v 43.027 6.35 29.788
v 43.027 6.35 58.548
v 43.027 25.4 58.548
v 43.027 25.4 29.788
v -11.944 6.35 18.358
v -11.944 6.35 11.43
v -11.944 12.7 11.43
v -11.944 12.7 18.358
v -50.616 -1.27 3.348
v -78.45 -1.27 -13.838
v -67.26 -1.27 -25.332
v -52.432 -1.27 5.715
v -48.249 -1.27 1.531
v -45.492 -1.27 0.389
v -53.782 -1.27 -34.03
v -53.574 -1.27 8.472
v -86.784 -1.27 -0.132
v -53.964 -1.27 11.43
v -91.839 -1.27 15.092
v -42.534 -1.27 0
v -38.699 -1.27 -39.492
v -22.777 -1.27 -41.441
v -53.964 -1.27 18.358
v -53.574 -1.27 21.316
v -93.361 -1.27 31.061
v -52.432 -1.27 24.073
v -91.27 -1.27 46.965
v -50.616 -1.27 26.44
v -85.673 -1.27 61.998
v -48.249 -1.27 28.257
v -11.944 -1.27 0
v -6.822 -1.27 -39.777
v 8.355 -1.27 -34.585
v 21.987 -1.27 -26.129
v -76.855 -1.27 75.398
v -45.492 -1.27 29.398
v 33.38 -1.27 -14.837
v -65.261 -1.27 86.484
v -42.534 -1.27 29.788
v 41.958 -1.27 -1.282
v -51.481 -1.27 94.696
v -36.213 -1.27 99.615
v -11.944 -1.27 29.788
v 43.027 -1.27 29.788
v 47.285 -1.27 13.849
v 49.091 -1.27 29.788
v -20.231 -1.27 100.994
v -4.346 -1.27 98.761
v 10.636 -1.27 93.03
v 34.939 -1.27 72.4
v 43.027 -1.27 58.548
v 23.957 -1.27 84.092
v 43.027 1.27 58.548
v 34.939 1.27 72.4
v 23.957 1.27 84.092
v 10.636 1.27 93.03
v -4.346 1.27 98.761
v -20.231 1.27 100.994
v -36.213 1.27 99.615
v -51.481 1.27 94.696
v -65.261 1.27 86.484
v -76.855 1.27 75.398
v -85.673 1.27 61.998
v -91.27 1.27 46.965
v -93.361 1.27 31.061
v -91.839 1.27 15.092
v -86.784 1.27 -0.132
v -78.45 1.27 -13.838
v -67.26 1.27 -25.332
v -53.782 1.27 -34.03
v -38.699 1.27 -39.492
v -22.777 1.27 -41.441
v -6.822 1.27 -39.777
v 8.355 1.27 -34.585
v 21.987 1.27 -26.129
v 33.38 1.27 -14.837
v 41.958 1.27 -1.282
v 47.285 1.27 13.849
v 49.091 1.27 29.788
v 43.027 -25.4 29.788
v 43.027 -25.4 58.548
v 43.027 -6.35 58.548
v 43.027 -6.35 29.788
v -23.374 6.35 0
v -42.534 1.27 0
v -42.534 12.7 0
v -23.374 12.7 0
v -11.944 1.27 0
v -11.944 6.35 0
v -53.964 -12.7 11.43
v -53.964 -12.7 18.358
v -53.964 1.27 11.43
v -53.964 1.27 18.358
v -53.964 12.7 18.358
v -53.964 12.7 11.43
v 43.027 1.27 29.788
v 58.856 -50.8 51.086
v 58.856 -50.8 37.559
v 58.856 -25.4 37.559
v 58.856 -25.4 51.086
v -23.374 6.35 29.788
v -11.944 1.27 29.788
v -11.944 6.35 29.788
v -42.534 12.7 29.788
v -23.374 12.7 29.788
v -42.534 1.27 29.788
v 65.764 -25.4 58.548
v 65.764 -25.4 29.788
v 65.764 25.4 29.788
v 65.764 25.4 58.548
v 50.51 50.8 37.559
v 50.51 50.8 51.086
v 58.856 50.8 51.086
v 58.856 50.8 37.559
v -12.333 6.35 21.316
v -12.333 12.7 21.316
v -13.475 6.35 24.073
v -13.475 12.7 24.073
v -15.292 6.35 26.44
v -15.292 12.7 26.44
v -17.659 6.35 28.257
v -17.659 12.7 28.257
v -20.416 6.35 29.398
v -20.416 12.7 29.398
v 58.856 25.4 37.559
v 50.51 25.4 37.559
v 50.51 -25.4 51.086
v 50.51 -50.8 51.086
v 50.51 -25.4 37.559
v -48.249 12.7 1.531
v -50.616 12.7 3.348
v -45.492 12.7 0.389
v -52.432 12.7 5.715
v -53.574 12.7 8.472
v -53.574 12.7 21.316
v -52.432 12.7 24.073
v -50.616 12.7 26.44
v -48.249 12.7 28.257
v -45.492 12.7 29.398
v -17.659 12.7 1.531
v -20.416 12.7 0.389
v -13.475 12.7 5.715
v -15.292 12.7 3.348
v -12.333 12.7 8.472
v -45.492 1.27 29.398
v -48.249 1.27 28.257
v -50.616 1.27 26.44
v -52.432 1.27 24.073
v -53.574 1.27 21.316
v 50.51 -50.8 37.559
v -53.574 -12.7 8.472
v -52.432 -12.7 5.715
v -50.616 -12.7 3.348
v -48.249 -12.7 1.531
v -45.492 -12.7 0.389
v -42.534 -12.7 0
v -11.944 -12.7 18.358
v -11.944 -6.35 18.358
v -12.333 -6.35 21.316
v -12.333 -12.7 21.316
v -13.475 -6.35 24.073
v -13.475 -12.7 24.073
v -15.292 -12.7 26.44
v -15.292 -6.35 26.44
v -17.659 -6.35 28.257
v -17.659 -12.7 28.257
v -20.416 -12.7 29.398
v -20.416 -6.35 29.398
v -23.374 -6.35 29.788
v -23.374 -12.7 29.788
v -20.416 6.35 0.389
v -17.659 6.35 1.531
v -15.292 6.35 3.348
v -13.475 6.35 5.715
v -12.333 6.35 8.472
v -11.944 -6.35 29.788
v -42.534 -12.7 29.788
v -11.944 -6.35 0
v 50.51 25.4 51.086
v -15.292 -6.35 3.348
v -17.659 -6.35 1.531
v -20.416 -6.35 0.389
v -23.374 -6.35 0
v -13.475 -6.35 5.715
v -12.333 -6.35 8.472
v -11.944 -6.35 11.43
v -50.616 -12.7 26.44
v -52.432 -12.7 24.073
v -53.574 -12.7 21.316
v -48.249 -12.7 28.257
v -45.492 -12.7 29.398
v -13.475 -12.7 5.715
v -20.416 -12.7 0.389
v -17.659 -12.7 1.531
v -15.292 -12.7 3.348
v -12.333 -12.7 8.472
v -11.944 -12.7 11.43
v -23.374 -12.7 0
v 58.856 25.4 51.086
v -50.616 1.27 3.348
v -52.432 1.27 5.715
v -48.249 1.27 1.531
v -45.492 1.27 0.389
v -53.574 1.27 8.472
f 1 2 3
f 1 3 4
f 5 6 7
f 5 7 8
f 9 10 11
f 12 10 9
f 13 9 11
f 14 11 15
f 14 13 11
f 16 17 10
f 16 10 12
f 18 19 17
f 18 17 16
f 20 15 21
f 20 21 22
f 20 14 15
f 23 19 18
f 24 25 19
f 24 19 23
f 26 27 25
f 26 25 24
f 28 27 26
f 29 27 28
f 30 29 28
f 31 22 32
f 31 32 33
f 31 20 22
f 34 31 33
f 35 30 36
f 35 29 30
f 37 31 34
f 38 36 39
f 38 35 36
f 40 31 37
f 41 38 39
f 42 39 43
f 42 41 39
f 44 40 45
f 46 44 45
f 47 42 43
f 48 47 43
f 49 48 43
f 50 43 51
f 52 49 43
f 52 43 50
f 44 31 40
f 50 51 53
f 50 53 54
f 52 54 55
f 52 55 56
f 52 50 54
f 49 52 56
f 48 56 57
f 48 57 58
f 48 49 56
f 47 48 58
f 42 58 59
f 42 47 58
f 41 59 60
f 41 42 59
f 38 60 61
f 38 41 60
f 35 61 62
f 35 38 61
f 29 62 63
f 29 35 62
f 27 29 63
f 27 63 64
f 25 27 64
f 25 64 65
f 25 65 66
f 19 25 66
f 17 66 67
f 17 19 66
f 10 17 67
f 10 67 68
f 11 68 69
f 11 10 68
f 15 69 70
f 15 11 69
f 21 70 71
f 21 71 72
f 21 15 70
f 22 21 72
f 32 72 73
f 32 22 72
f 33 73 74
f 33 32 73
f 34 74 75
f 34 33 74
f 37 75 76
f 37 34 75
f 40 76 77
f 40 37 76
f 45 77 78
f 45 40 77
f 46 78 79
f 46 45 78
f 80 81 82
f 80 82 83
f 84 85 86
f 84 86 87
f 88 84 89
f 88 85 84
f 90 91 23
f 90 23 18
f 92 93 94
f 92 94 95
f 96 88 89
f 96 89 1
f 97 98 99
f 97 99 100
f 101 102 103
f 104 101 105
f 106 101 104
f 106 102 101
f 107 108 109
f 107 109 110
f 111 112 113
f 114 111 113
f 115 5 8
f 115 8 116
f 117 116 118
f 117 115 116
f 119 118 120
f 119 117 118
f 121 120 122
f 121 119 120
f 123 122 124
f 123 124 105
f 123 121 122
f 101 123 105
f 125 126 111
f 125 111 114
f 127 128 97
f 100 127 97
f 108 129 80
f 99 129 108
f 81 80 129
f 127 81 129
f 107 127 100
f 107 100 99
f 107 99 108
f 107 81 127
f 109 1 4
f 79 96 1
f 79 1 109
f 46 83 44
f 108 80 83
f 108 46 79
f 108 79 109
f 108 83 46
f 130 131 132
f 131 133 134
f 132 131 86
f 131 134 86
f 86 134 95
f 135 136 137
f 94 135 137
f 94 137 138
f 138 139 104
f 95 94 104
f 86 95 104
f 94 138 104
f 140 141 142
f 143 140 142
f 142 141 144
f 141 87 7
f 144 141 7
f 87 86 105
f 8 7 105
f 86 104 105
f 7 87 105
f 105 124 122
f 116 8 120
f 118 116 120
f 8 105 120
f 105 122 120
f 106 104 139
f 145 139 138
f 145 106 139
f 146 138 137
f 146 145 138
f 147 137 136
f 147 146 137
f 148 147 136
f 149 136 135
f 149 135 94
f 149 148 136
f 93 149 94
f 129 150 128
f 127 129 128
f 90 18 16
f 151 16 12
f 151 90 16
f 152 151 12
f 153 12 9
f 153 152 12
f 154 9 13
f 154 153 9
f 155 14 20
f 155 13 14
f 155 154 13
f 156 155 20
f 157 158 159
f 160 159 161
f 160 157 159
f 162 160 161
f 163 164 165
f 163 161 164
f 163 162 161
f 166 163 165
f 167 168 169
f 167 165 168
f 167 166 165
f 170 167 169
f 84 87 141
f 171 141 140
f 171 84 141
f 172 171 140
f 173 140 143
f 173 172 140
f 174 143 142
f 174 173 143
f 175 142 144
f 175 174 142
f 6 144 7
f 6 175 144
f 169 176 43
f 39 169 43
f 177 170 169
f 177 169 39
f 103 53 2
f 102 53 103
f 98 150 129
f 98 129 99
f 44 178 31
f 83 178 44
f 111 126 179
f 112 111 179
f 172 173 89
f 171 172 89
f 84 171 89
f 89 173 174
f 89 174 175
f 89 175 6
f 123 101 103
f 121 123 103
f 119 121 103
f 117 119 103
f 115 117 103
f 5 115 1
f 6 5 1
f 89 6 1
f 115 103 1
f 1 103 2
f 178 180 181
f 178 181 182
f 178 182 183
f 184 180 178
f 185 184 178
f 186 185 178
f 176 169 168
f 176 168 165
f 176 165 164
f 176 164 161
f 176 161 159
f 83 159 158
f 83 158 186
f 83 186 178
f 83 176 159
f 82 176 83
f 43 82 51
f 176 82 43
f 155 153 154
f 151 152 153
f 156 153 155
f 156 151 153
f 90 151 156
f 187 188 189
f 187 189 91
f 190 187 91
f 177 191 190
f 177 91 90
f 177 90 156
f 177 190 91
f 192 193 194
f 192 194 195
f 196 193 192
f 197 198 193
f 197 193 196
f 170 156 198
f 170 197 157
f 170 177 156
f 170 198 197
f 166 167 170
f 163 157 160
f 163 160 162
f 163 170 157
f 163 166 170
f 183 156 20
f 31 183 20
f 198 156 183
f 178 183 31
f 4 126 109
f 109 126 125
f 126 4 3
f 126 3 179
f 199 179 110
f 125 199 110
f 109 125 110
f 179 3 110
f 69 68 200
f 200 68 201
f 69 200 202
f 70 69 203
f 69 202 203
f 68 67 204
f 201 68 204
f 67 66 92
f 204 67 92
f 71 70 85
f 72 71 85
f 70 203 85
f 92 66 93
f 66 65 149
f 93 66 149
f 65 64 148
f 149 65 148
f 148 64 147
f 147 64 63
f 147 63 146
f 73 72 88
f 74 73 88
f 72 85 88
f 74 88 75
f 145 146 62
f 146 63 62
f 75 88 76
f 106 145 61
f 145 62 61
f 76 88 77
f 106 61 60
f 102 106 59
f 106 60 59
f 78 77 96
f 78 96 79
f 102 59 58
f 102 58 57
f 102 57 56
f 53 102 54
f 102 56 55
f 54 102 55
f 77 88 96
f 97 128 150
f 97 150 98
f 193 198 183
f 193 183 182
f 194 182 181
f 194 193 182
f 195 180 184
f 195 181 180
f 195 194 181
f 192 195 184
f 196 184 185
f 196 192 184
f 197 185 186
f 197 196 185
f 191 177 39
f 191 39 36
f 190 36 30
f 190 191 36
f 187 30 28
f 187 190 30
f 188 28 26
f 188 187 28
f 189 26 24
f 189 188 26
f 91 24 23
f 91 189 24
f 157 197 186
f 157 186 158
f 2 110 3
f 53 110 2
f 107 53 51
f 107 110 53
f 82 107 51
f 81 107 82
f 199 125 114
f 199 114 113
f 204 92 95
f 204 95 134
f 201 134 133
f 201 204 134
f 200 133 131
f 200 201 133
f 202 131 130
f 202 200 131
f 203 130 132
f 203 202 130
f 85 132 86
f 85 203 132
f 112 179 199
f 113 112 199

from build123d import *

# Parameters (mm, degrees)
F1_DEPTH = 12.7
F2_DEPTH = 6.35
F0_W     = 8.346368
F0_H     = 13.526869
F3_DEPTH = 25.4
F4_DEPTH = 50.8
F5_DEPTH = 1.27


with BuildPart() as f1:
    # F0 (on Front) → F1 (new body, symmetric)
    with BuildSketch(Plane.XZ):
        with BuildLine():
            Line((-42.533579, 0), (-23.373938, 0))
            ThreePointArc((-23.373938, 0), (-15.291708, 3.347769), (-11.943938, 11.43))
            Line((-11.943938, 11.43), (-11.943938, 18.357894))
            ThreePointArc((-11.943938, 18.357894), (-15.291708, 26.440125), (-23.373938, 29.787894))
            Line((-23.373938, 29.787894), (-42.533579, 29.787894))
            ThreePointArc((-42.533579, 29.787894), (-50.61581, 26.440125), (-53.963579, 18.357894))
            Line((-53.963579, 18.357894), (-53.963579, 11.43))
            ThreePointArc((-53.963579, 11.43), (-50.61581, 3.347769), (-42.533579, 0))
        make_face()
    extrude(amount=F1_DEPTH, both=True)

    # F0 (on Front) → F2 (join, symmetric)
    with BuildSketch(Plane.XZ):
        with BuildLine():
            ThreePointArc((-11.943938, 11.43), (-15.291708, 3.347769), (-23.373938, 0))
            Line((-23.373938, 0), (-11.943938, 0))
            Line((-11.943938, 0), (43.026961, 29.787894))
            Line((43.026961, 29.787894), (43.026961, 58.54751))
            Line((43.026961, 58.54751), (-11.943938, 29.787894))
            Line((-11.943938, 29.787894), (-23.373938, 29.787894))
            ThreePointArc((-23.373938, 29.787894), (-15.291708, 26.440125), (-11.943938, 18.357894))
            Line((-11.943938, 18.357894), (-11.943938, 11.43))
        make_face()
    extrude(amount=F2_DEPTH, both=True)

    # F0 (on Front) → F3 (join, symmetric)
    with BuildSketch(Plane.XZ):
        Polygon((43.026961, 58.54751), (43.026961, 29.787894), (49.09091, 29.787894), (65.763615, 29.787894), (65.763615, 58.54751), align=None)
        with Locations((54.683095, 44.322086)):
            Rectangle(F0_W, F0_H, mode=Mode.SUBTRACT)
    extrude(amount=F3_DEPTH, both=True)

    # F0 (on Front) → F4 (join, symmetric)
    with BuildSketch(Plane.XZ):
        with Locations((54.683095, 44.322086)):
            Rectangle(F0_W, F0_H)
    extrude(amount=F4_DEPTH, both=True)

    # F0 (on Front) → F5 (join, symmetric)
    with BuildSketch(Plane.XZ):
        with BuildLine():
            Line((-11.943938, 0), (-23.373938, 0))
            Line((-23.373938, 0), (-42.533579, 0))
            ThreePointArc((-42.533579, 0), (-50.61581, 3.347769), (-53.963579, 11.43))
            Line((-53.963579, 11.43), (-53.963579, 18.357894))
            ThreePointArc((-53.963579, 18.357894), (-50.61581, 26.440125), (-42.533579, 29.787894))
            Line((-42.533579, 29.787894), (-23.373938, 29.787894))
            Line((-23.373938, 29.787894), (-11.943938, 29.787894))
            Line((-11.943938, 29.787894), (43.026961, 58.54751))
            ThreePointArc((43.026961, 58.54751), (-91.839408, 15.091917), (49.09091, 29.787894))
            Line((49.09091, 29.787894), (43.026961, 29.787894))
            Line((43.026961, 29.787894), (-11.943938, 0))
        make_face()
    extrude(amount=F5_DEPTH, both=True)


solid = f1.part
